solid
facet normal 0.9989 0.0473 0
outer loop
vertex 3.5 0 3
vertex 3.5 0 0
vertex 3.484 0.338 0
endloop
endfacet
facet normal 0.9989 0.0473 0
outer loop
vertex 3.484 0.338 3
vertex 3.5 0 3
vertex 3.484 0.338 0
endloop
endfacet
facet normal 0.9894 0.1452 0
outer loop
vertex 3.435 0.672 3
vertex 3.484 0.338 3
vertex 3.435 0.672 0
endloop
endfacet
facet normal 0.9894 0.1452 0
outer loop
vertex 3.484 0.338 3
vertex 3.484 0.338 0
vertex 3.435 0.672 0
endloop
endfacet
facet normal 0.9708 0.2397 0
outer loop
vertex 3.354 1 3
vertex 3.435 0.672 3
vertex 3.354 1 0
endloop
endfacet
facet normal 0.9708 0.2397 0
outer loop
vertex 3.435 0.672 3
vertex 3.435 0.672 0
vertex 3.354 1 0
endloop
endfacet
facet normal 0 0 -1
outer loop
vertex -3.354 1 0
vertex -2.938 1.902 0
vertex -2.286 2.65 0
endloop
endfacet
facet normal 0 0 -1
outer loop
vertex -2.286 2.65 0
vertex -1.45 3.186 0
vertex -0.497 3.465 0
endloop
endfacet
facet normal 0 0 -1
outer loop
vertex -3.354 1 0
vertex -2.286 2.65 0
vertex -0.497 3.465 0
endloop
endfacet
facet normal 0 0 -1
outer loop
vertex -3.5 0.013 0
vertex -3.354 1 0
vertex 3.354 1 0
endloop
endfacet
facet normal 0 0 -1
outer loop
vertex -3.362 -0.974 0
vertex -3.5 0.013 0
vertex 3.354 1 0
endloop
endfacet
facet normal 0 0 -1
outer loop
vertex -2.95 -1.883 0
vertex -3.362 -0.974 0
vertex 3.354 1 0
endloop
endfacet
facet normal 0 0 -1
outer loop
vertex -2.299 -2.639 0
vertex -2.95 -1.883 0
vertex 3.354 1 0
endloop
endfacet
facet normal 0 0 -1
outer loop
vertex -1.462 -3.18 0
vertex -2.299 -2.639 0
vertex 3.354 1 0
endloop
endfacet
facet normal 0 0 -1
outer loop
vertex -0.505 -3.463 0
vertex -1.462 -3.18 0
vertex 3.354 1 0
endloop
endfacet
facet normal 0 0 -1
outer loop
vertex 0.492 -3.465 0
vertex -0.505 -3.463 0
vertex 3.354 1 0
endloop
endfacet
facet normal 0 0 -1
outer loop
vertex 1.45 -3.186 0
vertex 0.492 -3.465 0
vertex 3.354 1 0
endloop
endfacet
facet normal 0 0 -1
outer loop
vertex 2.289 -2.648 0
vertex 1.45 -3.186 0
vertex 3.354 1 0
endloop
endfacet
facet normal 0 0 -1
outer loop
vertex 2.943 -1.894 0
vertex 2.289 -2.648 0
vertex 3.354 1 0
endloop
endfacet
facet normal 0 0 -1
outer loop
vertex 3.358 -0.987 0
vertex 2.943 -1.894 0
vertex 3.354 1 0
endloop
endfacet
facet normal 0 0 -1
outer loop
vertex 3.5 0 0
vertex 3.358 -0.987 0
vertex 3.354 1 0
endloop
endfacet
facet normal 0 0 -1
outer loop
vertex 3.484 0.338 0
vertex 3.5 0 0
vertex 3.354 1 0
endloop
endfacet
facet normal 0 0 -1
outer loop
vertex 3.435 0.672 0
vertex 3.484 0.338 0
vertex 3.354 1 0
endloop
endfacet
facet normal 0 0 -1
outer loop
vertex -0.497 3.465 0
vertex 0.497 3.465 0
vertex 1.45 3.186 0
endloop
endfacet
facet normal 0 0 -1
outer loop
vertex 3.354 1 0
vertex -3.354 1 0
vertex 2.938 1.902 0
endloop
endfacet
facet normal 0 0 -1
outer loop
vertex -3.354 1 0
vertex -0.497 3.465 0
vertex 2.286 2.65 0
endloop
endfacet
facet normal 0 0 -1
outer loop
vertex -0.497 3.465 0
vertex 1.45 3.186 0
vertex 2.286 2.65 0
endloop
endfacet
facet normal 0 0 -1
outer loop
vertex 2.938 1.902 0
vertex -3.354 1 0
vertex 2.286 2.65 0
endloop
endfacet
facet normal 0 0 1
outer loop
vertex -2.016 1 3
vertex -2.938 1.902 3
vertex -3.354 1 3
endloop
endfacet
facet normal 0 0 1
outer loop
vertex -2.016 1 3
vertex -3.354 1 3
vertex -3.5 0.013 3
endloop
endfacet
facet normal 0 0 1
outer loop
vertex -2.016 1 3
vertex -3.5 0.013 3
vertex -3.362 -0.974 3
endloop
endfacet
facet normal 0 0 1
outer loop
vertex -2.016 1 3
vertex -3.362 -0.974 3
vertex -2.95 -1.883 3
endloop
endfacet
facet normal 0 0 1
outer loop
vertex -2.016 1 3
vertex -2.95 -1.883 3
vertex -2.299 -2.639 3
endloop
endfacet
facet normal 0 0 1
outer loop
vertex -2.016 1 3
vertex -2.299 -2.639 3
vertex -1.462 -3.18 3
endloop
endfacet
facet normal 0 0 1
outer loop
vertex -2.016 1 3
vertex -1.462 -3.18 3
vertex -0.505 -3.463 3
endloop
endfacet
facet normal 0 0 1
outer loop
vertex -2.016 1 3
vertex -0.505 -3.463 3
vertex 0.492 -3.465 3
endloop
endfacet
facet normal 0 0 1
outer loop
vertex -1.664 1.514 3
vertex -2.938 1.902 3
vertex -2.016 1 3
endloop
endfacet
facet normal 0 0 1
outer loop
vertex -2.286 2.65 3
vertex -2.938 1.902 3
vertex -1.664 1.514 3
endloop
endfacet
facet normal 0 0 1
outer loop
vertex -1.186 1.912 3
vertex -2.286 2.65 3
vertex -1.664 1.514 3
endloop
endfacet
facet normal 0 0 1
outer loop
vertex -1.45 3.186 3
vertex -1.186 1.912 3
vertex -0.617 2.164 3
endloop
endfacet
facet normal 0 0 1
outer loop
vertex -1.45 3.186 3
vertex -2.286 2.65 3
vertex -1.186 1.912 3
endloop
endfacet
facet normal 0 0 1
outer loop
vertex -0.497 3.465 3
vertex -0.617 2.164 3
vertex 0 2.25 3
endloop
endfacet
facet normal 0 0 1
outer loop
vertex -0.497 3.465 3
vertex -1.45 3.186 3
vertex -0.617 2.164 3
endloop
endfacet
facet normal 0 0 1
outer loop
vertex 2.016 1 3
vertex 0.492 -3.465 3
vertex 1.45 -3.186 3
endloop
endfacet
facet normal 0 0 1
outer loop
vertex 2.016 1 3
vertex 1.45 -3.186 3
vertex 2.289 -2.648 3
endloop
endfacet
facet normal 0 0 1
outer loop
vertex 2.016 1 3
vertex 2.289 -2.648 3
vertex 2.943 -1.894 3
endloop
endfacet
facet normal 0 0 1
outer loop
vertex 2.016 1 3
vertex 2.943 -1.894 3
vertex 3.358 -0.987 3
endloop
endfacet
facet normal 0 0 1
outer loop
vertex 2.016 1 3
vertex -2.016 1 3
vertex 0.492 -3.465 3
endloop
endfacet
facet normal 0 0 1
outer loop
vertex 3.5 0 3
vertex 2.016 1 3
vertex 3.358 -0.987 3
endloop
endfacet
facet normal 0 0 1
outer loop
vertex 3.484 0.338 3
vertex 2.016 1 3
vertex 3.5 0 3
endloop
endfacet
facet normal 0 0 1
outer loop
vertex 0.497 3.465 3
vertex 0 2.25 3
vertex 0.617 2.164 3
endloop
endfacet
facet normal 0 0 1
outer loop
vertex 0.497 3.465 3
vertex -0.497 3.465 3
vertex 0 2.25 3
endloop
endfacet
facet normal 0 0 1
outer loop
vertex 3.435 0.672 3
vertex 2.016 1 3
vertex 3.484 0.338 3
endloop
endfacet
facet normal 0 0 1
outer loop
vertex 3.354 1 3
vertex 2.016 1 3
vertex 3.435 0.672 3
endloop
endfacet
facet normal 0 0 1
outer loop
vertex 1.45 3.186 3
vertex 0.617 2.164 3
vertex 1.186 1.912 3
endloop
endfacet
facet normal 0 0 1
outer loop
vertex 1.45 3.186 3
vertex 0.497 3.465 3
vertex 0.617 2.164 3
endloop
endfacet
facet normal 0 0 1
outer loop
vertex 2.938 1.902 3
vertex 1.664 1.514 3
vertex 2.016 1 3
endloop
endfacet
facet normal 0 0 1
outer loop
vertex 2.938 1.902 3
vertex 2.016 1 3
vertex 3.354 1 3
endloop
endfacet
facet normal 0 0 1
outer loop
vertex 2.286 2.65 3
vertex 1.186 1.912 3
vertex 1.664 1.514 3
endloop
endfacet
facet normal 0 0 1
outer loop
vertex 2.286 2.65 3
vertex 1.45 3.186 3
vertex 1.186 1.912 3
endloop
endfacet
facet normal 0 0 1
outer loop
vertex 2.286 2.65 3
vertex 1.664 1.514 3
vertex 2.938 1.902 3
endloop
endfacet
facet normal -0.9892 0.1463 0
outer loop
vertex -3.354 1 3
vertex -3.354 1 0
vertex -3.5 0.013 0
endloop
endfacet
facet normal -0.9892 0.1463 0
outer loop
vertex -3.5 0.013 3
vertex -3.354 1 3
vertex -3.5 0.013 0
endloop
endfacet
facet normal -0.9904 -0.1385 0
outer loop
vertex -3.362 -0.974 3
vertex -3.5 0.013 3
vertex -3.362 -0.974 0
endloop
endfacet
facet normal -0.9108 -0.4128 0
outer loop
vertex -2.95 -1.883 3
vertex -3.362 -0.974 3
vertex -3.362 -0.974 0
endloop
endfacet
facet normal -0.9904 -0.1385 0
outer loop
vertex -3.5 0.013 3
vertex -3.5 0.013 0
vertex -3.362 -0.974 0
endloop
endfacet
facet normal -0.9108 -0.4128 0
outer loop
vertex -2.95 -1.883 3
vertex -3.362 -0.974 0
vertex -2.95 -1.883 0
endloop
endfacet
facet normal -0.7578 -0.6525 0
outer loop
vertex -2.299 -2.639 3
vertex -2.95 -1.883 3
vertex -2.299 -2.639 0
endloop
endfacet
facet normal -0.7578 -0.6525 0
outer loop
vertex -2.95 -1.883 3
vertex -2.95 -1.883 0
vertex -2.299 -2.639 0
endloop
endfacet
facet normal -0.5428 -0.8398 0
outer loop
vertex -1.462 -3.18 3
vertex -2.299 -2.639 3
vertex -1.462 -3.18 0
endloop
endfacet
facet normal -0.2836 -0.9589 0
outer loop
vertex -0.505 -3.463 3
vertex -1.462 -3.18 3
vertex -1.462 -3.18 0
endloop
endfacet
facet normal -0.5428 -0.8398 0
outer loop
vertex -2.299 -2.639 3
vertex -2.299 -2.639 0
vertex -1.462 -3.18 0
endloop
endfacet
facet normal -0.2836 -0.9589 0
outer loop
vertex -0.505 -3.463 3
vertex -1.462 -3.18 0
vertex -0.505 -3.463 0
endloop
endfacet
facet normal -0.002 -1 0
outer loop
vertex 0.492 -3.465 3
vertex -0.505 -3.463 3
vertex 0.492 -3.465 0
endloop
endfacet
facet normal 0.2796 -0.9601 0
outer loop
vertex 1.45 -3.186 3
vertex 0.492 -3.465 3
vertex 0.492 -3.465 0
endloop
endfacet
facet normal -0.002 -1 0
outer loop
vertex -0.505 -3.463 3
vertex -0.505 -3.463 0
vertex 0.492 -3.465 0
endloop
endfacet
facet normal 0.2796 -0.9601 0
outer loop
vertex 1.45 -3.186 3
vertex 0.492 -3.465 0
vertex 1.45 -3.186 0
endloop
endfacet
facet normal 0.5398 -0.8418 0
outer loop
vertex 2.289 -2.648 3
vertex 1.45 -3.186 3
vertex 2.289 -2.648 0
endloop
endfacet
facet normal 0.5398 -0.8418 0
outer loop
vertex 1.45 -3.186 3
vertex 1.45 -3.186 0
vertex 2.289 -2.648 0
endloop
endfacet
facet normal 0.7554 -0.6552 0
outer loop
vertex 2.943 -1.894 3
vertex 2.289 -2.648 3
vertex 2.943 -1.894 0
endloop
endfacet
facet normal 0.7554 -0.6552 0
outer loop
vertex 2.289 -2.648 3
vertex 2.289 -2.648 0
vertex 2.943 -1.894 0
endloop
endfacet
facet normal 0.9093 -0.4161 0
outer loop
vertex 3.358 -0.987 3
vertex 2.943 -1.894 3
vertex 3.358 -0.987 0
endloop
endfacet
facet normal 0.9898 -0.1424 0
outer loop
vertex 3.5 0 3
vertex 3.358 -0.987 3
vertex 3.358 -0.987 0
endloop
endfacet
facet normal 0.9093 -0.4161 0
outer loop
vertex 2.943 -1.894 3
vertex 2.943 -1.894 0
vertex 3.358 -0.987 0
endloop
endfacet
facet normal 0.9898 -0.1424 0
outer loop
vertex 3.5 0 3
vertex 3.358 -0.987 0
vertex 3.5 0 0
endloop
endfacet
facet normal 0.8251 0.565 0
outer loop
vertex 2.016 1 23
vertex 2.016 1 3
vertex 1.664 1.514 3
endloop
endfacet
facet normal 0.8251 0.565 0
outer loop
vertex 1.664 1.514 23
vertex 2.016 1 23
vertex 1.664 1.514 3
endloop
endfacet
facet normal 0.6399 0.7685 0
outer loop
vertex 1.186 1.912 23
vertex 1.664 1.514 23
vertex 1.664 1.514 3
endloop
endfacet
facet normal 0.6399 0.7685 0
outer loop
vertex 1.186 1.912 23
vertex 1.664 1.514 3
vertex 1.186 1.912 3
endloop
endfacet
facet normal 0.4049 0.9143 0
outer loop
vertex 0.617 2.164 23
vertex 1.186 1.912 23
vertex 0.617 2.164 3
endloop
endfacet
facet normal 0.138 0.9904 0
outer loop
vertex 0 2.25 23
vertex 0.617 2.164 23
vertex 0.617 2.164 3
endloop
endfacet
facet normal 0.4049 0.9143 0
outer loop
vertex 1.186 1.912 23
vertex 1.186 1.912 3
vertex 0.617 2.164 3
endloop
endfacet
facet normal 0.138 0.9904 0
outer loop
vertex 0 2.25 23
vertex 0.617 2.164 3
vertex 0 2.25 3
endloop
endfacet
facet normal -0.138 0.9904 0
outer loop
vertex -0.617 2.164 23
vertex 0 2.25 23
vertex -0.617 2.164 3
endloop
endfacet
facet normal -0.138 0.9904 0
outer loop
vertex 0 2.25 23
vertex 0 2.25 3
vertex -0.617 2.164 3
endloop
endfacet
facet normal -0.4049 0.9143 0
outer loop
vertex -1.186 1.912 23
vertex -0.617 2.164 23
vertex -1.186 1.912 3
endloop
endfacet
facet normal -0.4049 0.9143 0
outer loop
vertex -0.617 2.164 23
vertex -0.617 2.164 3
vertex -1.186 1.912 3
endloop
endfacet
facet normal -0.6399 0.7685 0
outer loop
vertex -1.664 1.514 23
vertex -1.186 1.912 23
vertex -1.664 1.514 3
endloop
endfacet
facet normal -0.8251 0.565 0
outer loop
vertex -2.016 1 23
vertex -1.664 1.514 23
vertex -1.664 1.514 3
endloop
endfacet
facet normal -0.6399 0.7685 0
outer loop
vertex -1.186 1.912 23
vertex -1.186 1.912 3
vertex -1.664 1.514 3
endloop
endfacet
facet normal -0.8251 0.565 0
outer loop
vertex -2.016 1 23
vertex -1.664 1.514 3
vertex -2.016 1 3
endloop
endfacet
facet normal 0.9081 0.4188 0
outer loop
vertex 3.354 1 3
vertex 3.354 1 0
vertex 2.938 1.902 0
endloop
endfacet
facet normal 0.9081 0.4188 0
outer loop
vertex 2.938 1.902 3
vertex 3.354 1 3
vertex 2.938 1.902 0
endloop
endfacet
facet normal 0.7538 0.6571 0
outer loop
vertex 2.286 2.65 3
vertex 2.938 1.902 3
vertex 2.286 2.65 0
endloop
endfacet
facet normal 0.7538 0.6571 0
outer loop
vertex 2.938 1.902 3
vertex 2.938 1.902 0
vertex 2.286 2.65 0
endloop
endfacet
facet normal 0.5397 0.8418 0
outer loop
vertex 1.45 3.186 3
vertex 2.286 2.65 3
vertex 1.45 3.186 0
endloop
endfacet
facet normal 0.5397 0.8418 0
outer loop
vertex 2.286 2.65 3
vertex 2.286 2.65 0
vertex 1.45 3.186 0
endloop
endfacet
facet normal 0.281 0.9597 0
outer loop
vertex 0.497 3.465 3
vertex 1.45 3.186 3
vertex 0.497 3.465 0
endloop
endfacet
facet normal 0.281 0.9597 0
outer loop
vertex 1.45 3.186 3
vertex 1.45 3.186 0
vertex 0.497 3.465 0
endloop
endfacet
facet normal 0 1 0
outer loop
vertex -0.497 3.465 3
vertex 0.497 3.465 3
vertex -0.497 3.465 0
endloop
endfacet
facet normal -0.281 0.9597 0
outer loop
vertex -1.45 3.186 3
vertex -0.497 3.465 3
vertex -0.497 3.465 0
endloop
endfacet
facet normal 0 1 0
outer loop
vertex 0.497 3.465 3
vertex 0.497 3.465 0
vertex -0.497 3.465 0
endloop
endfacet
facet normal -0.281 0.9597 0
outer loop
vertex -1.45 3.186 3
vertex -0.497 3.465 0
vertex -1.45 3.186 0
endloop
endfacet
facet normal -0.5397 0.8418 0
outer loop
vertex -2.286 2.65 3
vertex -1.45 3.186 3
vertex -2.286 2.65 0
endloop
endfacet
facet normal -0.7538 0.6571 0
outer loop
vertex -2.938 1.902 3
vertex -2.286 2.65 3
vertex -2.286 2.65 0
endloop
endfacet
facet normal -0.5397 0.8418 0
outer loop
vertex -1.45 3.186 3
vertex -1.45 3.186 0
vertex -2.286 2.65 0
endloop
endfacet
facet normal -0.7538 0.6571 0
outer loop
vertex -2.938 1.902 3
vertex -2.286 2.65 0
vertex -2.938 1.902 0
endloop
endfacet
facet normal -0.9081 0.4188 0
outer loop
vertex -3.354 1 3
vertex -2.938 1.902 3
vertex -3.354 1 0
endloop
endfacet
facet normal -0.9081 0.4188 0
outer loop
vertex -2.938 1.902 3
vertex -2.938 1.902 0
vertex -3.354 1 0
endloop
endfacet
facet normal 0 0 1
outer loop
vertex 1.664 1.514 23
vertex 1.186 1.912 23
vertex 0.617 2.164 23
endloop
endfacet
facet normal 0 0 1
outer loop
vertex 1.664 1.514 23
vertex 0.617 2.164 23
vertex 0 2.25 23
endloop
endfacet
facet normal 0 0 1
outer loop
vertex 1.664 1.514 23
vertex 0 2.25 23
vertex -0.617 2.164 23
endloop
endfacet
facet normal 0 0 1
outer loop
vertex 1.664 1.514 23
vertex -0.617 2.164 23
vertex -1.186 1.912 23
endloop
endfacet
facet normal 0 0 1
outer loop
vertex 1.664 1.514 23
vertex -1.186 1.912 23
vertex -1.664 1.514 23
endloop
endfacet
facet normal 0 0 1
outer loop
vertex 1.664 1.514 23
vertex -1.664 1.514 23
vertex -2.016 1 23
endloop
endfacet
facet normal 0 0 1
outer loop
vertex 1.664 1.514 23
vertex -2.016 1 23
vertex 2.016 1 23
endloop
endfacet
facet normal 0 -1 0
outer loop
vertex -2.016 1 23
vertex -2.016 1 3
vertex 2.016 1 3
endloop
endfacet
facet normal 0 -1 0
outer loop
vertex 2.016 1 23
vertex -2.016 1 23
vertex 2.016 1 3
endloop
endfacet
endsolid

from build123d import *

# Parameters (mm, degrees)
BOSS_EXTRUDE1_DEPTH = 3
BOSS_EXTRUDE2_DEPTH = 20


with BuildPart() as part:
    # Sketch1 → Boss-Extrude1 (new body)
    with BuildSketch(Plane.XY):
        with BuildLine():
            ThreePointArc((3.354101966, 1), (0, 3.5), (-3.354101966, 1))
            Line((-3.354101966, 1), (3.354101966, 1))
        make_face()
        with BuildLine():
            Line((3.354101966, 1), (-3.354101966, 1))
            ThreePointArc((-3.354101966, 1), (-0.505293538, -3.463333429), (3.5, 0))
            ThreePointArc((3.5, 0), (3.463333429, 0.505293538), (3.354101966, 1))
        make_face()
    extrude(amount=BOSS_EXTRUDE1_DEPTH)

    # Sketch2 → Boss-Extrude2 (add)
    with BuildSketch(Plane.XY.offset(3)):
        with BuildLine():
            ThreePointArc((2.015564437, 1), (0, 2.25), (-2.015564437, 1))
            Line((-2.015564437, 1), (2.015564437, 1))
        make_face()
    extrude(amount=BOSS_EXTRUDE2_DEPTH)


solid = part.part
